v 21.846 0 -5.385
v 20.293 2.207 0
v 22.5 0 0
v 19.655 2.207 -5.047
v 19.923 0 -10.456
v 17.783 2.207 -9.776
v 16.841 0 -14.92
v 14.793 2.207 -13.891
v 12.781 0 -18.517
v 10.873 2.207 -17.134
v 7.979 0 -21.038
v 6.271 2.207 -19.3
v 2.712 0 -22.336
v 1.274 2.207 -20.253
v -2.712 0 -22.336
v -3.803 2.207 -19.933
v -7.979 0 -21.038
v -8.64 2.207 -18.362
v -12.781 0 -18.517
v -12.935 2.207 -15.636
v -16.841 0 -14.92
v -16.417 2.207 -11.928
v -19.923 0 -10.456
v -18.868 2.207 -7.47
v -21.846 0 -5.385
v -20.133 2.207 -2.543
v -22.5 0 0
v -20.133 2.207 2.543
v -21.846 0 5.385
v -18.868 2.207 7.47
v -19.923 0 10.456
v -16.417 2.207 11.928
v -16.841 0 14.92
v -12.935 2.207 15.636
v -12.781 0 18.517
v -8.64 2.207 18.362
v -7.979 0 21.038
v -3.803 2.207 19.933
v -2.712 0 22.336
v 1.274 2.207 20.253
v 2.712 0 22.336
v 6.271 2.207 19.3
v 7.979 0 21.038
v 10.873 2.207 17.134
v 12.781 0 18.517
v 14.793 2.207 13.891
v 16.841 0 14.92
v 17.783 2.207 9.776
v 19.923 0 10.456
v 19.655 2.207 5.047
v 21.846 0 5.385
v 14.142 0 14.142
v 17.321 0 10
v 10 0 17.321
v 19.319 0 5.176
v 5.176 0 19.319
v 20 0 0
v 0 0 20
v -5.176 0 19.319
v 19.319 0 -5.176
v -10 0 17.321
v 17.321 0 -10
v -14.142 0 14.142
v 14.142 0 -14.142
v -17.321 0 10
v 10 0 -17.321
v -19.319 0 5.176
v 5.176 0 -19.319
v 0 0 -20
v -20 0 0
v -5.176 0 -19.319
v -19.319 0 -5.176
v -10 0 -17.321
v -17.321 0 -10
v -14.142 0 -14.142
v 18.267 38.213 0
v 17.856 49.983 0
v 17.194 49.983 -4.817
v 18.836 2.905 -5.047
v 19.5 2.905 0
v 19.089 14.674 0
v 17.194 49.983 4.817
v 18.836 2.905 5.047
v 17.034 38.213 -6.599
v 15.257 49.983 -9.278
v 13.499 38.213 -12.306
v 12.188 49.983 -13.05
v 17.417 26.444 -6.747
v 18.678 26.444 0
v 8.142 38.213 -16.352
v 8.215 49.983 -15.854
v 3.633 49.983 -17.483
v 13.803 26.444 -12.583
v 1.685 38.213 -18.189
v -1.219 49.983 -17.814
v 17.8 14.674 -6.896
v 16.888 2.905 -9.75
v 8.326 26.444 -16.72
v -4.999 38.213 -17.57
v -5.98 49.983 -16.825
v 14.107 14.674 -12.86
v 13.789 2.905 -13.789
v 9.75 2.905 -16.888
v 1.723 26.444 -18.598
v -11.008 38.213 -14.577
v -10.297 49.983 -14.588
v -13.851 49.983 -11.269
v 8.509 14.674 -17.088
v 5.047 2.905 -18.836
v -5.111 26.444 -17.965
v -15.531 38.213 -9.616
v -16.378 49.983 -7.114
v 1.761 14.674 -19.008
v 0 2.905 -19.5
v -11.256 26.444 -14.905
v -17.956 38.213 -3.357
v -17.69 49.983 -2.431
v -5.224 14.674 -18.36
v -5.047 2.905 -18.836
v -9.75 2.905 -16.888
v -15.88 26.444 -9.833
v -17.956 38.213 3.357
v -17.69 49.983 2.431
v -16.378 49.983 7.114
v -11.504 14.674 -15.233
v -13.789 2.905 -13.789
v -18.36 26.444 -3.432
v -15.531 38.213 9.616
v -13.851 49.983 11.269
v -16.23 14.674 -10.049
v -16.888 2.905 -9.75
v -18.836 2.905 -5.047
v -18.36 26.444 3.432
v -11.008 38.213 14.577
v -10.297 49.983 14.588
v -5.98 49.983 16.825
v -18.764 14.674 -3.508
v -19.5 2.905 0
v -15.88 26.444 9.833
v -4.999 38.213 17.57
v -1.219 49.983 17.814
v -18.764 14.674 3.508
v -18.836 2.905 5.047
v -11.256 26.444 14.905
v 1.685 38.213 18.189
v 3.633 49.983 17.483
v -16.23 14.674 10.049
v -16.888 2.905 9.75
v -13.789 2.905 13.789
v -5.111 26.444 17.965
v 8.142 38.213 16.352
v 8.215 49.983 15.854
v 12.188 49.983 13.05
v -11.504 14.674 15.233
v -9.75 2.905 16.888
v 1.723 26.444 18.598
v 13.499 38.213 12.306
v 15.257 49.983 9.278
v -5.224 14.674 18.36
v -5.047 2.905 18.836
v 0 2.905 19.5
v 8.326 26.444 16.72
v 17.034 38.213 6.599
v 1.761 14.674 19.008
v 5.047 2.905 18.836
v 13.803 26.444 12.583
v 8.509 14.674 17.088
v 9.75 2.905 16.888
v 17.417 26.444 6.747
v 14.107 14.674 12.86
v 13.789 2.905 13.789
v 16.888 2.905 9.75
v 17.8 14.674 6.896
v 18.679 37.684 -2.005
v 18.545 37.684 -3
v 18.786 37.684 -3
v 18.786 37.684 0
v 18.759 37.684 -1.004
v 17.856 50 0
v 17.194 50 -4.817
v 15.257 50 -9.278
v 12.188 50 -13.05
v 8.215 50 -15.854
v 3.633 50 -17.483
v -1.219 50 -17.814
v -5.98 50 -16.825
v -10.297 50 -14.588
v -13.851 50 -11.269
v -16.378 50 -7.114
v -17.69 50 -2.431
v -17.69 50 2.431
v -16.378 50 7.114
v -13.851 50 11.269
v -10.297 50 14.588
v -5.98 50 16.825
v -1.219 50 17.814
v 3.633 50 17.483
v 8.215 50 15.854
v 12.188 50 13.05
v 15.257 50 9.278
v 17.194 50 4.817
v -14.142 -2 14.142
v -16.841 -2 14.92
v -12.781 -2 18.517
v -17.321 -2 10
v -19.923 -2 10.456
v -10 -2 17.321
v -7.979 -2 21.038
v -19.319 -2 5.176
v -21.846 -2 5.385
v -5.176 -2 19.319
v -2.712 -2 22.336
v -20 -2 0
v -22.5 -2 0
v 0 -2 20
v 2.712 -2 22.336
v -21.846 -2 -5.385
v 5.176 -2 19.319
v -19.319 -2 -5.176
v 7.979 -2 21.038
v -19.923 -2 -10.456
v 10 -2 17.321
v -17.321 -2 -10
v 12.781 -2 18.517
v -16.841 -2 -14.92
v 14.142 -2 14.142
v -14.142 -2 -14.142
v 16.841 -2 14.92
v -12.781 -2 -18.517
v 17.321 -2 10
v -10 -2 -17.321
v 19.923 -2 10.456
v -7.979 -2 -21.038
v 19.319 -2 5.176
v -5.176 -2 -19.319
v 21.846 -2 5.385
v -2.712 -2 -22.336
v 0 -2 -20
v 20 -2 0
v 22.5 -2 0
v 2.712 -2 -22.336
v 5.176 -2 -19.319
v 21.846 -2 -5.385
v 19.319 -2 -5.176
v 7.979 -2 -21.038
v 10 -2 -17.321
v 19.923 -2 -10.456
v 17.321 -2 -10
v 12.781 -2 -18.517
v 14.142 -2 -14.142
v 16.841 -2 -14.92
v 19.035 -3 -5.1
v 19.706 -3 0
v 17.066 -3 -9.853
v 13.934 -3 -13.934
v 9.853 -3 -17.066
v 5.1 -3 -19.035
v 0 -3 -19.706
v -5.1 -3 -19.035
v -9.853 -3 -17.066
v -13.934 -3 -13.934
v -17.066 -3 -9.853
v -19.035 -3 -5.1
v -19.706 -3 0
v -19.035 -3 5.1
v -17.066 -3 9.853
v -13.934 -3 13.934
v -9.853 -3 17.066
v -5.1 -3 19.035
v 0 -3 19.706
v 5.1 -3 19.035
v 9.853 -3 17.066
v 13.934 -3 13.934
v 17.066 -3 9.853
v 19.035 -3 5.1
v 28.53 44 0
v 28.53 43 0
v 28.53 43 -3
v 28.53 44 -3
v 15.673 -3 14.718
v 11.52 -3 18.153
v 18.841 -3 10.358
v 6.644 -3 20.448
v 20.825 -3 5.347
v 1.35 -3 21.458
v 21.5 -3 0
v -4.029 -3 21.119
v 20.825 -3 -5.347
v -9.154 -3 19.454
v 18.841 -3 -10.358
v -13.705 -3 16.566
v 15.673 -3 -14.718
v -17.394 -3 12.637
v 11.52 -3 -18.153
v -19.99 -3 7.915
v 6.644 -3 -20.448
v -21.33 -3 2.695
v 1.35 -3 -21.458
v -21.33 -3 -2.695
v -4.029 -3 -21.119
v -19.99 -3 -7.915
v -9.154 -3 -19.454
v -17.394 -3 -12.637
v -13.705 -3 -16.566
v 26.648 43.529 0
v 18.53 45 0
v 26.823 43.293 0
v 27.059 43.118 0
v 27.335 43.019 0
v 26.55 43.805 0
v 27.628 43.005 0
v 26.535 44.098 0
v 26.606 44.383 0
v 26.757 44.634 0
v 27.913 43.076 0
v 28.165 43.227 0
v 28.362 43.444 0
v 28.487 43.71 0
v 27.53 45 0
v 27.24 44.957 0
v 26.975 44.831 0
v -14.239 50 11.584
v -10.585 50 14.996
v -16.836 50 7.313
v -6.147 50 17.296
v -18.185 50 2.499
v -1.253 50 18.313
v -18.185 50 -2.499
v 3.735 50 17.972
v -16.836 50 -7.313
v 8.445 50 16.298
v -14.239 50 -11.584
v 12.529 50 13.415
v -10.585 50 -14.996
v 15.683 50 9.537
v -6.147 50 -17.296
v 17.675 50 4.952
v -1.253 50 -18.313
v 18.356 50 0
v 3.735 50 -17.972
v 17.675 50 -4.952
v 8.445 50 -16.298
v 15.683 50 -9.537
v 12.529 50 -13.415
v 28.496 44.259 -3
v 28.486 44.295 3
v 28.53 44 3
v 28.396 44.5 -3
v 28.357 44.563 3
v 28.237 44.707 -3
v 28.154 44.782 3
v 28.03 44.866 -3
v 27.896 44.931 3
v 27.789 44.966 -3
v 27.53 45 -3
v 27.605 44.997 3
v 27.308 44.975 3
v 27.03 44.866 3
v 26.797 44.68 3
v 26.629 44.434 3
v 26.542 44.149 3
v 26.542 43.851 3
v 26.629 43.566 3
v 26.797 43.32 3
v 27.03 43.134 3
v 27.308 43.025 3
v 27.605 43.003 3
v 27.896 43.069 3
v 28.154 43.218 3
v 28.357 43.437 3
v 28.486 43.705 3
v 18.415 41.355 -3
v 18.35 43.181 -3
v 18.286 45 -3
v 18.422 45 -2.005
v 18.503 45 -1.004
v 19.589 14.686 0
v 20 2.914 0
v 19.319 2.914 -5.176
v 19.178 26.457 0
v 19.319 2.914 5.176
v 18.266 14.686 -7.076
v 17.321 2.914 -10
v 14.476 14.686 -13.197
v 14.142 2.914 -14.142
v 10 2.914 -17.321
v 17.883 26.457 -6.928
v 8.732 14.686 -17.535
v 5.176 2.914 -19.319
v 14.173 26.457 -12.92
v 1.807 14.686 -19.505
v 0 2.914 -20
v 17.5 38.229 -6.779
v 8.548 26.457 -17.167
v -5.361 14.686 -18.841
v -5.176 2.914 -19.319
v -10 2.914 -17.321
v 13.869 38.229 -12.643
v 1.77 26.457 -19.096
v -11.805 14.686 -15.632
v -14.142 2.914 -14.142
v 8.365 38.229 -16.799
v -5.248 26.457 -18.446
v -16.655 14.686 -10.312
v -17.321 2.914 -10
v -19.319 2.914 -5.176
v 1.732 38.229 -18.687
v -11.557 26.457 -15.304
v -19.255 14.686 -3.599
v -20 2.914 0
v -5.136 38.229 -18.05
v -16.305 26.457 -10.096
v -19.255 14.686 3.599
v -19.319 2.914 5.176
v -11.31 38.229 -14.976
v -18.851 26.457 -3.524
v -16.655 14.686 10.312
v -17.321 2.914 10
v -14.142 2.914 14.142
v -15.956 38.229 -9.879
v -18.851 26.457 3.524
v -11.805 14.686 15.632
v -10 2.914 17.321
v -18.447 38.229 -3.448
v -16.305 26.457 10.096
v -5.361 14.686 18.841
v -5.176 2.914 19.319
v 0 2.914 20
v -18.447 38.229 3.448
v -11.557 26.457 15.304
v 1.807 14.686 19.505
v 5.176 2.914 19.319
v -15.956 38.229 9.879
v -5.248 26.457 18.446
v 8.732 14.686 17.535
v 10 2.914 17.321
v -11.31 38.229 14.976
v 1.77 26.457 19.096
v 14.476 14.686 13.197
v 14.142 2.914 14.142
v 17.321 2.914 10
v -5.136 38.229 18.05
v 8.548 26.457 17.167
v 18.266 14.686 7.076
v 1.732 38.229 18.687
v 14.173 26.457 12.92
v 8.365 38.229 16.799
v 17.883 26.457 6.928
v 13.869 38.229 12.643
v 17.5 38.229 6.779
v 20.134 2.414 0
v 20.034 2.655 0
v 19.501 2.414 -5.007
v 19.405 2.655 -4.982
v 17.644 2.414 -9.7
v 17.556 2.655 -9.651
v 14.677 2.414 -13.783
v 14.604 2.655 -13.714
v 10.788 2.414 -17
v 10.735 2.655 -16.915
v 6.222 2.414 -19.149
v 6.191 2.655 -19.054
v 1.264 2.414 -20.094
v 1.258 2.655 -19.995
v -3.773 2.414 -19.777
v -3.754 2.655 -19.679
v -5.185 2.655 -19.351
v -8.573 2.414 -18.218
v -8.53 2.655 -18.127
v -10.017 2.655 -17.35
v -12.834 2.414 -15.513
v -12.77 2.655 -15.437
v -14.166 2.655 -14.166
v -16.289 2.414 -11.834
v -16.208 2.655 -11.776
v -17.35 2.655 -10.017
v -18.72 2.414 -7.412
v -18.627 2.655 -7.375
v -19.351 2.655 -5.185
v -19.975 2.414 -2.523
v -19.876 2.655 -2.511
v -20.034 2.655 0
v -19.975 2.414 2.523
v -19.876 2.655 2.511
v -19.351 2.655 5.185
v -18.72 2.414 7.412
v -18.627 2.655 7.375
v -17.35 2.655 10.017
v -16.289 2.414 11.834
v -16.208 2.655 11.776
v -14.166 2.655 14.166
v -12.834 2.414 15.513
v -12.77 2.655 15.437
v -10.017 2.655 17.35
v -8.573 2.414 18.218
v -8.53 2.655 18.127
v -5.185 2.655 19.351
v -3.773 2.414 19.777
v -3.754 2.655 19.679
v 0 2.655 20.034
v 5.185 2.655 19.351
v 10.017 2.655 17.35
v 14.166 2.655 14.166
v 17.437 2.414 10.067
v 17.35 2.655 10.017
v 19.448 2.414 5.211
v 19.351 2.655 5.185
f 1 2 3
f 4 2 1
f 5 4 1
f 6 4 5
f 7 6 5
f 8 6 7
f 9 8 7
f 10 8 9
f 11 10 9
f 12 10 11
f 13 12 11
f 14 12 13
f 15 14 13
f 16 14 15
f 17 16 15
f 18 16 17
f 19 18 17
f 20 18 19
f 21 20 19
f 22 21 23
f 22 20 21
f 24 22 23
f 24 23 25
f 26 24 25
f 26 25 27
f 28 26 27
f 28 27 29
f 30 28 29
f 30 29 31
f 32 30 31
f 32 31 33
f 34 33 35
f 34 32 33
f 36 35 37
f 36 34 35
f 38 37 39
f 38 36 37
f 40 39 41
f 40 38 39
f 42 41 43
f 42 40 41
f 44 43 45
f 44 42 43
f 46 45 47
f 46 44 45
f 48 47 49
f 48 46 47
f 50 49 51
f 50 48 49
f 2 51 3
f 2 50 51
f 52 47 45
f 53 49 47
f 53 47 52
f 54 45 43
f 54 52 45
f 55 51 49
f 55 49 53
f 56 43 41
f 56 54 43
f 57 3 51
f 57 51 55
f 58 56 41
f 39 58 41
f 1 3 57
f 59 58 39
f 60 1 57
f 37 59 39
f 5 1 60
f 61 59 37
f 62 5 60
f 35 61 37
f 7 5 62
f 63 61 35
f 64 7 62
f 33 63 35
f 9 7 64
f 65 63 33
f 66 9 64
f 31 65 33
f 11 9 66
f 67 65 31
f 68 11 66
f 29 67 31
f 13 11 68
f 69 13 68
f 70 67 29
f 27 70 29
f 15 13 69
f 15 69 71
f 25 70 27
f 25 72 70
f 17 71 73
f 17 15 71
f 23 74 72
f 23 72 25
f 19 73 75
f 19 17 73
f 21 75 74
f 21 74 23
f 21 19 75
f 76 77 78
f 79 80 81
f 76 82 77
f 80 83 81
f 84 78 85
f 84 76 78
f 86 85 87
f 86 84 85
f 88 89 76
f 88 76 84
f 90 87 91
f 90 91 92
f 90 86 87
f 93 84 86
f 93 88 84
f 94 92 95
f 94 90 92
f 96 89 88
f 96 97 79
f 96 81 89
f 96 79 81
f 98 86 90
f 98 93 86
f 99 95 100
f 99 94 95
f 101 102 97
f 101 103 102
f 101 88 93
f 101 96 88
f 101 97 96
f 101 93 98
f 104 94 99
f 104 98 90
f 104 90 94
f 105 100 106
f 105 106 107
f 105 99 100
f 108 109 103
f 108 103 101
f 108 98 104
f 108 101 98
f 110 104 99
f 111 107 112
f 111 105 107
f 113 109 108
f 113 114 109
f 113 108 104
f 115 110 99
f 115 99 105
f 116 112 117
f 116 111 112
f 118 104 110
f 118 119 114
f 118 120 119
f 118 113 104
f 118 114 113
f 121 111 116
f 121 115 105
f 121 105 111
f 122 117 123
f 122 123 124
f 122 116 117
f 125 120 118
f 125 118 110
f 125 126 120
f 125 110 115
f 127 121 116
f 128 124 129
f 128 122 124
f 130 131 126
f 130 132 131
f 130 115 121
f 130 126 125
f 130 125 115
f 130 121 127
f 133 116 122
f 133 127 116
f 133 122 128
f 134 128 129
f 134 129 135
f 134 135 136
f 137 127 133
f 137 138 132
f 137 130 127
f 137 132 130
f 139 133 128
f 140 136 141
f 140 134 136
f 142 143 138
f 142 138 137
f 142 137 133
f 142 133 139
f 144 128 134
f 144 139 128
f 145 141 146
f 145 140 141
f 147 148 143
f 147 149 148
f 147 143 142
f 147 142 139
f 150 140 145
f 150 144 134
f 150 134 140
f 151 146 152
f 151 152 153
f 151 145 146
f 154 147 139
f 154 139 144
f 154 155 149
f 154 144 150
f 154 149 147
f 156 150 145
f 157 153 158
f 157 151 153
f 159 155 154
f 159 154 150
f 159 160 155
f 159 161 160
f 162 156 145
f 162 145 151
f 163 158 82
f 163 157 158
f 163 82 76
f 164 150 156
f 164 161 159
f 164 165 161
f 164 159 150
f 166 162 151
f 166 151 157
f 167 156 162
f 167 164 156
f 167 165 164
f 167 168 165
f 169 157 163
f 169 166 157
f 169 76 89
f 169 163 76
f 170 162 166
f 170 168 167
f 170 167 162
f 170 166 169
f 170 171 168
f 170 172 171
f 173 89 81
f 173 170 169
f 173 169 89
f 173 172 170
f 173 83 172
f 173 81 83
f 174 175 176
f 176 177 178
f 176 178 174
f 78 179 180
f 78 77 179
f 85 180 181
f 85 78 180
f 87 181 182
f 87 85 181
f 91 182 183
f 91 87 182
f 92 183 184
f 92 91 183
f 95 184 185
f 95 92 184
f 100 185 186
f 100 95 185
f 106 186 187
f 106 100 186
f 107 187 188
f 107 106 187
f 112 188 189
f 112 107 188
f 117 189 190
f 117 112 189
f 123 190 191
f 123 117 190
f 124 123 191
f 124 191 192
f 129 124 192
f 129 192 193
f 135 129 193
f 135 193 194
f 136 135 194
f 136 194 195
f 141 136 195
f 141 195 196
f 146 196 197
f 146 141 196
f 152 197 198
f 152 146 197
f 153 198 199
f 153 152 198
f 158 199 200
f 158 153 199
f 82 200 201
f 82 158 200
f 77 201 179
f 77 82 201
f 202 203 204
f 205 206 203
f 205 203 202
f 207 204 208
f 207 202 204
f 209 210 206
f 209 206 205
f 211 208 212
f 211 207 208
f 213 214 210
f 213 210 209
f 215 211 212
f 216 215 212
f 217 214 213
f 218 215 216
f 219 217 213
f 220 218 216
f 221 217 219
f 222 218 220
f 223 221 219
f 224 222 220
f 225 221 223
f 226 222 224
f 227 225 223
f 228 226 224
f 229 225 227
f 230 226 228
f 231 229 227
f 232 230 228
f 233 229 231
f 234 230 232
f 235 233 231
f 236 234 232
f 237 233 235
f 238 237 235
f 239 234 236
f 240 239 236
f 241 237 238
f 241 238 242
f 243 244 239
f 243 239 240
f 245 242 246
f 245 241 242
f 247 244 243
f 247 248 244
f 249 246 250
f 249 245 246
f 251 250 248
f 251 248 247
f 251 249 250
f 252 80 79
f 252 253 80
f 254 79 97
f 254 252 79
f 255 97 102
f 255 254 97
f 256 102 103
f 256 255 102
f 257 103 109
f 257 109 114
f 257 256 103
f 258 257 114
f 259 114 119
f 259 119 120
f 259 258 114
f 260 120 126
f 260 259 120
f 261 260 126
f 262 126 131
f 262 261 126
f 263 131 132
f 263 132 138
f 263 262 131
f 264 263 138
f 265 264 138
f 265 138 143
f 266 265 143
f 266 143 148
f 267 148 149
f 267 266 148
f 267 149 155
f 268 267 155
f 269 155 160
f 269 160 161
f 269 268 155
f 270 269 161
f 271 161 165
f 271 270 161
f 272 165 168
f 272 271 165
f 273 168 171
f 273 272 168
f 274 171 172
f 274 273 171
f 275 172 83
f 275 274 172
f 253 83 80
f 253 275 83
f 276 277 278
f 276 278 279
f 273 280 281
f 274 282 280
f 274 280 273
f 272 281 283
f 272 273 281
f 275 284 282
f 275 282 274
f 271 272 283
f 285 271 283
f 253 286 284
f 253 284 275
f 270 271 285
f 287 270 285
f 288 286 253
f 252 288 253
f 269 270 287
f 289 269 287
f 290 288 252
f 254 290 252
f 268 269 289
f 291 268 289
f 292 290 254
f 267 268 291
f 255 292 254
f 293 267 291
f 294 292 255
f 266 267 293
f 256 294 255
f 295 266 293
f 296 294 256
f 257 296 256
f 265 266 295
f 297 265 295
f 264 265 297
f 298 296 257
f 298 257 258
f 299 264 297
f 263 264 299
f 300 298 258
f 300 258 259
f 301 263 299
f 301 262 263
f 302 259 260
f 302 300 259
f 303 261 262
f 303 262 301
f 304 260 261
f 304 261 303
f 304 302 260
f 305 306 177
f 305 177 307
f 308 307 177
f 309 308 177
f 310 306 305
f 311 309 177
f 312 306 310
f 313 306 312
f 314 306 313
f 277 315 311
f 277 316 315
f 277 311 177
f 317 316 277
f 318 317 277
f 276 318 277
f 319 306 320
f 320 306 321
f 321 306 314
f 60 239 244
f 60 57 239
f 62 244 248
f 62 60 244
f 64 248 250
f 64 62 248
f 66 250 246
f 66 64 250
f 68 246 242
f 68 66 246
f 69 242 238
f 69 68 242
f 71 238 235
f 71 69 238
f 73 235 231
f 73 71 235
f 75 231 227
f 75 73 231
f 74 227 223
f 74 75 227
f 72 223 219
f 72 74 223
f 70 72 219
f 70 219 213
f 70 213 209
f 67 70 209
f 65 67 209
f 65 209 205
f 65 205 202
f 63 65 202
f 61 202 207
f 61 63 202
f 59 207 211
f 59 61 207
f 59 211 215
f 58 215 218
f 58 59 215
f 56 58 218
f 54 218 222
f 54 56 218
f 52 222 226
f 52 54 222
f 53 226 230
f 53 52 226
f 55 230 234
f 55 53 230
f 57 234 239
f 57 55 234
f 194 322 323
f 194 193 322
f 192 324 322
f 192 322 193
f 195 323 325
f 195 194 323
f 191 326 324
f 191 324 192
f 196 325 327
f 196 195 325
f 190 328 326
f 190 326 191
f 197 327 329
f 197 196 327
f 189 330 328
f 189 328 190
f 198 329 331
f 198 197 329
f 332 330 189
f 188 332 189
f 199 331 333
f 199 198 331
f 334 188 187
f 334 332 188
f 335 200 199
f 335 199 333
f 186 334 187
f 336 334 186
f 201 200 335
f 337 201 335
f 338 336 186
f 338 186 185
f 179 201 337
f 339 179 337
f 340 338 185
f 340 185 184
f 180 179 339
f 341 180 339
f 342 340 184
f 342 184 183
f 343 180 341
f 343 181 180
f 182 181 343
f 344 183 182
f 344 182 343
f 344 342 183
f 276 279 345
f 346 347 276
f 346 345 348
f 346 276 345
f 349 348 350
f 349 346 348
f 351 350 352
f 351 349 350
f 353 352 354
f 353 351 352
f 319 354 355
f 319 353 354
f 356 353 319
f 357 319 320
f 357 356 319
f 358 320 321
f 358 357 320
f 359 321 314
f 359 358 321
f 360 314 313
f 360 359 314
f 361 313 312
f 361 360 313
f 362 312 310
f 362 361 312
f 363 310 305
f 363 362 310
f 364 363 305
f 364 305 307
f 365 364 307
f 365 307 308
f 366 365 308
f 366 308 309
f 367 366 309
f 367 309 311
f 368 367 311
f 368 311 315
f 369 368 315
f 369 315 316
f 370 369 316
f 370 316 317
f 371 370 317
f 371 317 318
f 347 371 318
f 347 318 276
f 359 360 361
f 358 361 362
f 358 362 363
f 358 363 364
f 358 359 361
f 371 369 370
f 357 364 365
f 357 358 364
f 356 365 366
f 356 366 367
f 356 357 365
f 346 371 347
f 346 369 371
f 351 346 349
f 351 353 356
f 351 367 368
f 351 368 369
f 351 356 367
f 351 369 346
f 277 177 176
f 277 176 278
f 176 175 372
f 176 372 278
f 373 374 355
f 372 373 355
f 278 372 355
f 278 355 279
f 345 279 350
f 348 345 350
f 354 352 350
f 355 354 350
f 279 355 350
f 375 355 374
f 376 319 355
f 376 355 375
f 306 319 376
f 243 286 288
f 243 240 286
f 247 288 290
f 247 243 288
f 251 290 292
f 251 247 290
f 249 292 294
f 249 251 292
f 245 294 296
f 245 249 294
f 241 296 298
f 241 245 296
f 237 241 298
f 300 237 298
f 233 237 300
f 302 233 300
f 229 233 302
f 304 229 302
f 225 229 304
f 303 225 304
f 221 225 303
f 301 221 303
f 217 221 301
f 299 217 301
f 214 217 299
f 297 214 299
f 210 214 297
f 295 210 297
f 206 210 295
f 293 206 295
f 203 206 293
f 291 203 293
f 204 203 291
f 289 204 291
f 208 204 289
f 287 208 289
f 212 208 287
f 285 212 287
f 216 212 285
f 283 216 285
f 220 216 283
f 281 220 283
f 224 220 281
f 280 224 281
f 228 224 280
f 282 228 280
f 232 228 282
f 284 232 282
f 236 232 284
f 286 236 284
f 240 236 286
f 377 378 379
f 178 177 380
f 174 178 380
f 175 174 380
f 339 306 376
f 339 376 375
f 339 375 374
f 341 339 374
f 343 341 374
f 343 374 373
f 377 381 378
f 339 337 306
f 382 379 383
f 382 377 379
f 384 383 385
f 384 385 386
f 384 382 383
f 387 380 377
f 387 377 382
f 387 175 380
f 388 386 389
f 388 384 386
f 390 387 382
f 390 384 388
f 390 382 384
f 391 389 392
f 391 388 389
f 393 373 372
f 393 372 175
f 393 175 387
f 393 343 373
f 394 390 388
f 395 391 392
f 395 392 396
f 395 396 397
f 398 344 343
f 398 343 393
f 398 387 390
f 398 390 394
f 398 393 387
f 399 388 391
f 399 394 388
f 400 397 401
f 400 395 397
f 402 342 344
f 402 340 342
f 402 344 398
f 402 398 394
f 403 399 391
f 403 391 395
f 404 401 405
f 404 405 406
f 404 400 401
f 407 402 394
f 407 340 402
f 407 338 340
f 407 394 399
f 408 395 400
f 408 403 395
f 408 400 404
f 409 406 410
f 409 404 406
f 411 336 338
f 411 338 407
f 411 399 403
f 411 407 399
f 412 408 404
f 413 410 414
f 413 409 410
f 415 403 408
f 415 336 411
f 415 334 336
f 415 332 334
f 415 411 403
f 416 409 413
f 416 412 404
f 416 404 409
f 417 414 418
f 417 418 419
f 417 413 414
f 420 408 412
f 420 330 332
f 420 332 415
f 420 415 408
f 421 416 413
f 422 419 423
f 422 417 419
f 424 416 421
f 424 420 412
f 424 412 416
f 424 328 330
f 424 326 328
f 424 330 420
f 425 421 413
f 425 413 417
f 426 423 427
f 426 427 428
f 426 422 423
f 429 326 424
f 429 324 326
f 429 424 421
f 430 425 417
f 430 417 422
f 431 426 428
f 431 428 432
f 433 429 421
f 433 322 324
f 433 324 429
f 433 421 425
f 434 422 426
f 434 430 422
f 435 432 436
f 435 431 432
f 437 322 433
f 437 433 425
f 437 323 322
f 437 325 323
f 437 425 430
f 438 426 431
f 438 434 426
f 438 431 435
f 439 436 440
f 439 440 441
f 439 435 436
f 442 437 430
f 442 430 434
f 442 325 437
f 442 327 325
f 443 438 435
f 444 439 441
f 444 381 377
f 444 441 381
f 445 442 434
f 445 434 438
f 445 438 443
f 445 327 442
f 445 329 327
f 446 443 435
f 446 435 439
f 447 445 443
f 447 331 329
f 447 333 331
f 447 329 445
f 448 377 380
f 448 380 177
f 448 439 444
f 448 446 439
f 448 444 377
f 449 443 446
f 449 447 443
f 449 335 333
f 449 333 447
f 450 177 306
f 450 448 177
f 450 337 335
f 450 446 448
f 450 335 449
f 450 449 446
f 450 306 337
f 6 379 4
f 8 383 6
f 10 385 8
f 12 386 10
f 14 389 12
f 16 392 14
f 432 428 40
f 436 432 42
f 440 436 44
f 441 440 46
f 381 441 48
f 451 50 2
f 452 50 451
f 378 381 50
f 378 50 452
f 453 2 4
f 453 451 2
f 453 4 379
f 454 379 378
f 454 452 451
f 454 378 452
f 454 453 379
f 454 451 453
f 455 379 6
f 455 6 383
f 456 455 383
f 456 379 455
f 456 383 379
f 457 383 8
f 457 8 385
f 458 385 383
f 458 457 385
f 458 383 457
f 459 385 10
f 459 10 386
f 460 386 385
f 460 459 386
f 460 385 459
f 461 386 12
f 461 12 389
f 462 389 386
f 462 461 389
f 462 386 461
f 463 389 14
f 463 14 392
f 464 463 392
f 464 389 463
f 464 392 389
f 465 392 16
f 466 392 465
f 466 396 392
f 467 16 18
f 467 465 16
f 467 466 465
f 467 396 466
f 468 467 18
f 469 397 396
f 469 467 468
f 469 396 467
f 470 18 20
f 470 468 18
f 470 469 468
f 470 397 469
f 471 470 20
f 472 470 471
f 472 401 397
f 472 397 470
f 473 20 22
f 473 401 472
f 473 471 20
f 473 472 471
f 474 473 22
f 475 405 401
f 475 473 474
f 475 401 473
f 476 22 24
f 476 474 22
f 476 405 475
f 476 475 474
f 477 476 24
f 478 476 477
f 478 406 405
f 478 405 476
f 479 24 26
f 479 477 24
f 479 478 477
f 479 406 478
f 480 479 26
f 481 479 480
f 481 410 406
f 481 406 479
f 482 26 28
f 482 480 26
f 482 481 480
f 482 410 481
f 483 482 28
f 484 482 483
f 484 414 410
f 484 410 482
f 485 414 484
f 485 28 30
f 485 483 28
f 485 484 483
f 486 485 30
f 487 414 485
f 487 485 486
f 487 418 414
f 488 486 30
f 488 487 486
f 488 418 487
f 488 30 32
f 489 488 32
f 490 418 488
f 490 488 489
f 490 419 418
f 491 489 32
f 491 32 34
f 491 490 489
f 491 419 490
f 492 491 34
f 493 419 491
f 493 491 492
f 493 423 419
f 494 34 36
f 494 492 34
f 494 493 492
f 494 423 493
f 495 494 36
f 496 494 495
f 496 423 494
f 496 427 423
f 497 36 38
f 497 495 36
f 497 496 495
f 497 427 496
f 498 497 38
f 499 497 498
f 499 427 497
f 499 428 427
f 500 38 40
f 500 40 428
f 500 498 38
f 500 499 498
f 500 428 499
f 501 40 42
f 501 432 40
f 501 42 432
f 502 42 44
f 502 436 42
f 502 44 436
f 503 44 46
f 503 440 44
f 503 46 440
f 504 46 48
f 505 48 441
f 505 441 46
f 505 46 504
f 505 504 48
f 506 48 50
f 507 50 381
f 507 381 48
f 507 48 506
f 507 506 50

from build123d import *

# Parameters (mm, degrees)
BOSS_EXTRUDE1_DEPTH = 3
BOSS_EXTRUDE2_START = 3
BOSS_EXTRUDE2_DEPTH = 3


with BuildPart() as part:
    # Sketch1 → Revolve1 (revolve)
    with BuildSketch(Plane.XY):
        with BuildLine():
            Line((19.706224116, -3), (21.5, -3))
            Line((21.5, -3), (22.5, -2))
            Line((22.5, -2), (20, -2))
            Line((20, -2), (20, 0))
            Line((20, 0), (22.5, 0))
            Line((22.5, 0), (20.292893219, 2.207106781))
            ThreePointArc((20.292893219, 2.207106781), (20.076120467, 2.53153013), (20, 2.914213562))
            Line((20, 2.914213562), (18.355728105, 50))
            Line((18.355728105, 50), (17.856032692, 50))
            Line((17.856032692, 50), (17.856032692, 49.982550252))
            Line((17.856032692, 49.982550252), (19.500030777, 2.904604688))
            Line((19.500030777, 2.904604688), (19.706224116, -3))
        make_face()
    revolve(axis=Axis((0, 0, 0), (0, 1, 0)))

    # Sketch2 → Boss-Extrude1 (add)
    with BuildSketch(Plane.XY):
        with BuildLine():
            Line((18.285809554, 37.684078697), (18.785809554, 37.684078697))
            Line((18.785809554, 37.684078697), (28.530331953, 43))
            Line((28.530331953, 43), (28.530331953, 44))
            ThreePointArc((28.530331953, 44), (28.237438734, 44.707106781), (27.530331953, 45))
            Line((27.530331953, 45), (18.285809554, 45))
            Line((18.285809554, 45), (18.285809554, 37.684078697))
        make_face()
    extrude(amount=-BOSS_EXTRUDE1_DEPTH)

    # Sketch2<3> → Boss-Extrude2 (add)
    with BuildSketch(Plane.XY.offset(BOSS_EXTRUDE2_START)):
        with BuildLine():
            ThreePointArc((27.530331953, 45), (26.823225172, 43.292893219), (28.530331953, 44))
            ThreePointArc((28.530331953, 44), (28.237438734, 44.707106781), (27.530331953, 45))
        make_face()
    extrude(amount=-BOSS_EXTRUDE2_DEPTH)


solid = part.part
